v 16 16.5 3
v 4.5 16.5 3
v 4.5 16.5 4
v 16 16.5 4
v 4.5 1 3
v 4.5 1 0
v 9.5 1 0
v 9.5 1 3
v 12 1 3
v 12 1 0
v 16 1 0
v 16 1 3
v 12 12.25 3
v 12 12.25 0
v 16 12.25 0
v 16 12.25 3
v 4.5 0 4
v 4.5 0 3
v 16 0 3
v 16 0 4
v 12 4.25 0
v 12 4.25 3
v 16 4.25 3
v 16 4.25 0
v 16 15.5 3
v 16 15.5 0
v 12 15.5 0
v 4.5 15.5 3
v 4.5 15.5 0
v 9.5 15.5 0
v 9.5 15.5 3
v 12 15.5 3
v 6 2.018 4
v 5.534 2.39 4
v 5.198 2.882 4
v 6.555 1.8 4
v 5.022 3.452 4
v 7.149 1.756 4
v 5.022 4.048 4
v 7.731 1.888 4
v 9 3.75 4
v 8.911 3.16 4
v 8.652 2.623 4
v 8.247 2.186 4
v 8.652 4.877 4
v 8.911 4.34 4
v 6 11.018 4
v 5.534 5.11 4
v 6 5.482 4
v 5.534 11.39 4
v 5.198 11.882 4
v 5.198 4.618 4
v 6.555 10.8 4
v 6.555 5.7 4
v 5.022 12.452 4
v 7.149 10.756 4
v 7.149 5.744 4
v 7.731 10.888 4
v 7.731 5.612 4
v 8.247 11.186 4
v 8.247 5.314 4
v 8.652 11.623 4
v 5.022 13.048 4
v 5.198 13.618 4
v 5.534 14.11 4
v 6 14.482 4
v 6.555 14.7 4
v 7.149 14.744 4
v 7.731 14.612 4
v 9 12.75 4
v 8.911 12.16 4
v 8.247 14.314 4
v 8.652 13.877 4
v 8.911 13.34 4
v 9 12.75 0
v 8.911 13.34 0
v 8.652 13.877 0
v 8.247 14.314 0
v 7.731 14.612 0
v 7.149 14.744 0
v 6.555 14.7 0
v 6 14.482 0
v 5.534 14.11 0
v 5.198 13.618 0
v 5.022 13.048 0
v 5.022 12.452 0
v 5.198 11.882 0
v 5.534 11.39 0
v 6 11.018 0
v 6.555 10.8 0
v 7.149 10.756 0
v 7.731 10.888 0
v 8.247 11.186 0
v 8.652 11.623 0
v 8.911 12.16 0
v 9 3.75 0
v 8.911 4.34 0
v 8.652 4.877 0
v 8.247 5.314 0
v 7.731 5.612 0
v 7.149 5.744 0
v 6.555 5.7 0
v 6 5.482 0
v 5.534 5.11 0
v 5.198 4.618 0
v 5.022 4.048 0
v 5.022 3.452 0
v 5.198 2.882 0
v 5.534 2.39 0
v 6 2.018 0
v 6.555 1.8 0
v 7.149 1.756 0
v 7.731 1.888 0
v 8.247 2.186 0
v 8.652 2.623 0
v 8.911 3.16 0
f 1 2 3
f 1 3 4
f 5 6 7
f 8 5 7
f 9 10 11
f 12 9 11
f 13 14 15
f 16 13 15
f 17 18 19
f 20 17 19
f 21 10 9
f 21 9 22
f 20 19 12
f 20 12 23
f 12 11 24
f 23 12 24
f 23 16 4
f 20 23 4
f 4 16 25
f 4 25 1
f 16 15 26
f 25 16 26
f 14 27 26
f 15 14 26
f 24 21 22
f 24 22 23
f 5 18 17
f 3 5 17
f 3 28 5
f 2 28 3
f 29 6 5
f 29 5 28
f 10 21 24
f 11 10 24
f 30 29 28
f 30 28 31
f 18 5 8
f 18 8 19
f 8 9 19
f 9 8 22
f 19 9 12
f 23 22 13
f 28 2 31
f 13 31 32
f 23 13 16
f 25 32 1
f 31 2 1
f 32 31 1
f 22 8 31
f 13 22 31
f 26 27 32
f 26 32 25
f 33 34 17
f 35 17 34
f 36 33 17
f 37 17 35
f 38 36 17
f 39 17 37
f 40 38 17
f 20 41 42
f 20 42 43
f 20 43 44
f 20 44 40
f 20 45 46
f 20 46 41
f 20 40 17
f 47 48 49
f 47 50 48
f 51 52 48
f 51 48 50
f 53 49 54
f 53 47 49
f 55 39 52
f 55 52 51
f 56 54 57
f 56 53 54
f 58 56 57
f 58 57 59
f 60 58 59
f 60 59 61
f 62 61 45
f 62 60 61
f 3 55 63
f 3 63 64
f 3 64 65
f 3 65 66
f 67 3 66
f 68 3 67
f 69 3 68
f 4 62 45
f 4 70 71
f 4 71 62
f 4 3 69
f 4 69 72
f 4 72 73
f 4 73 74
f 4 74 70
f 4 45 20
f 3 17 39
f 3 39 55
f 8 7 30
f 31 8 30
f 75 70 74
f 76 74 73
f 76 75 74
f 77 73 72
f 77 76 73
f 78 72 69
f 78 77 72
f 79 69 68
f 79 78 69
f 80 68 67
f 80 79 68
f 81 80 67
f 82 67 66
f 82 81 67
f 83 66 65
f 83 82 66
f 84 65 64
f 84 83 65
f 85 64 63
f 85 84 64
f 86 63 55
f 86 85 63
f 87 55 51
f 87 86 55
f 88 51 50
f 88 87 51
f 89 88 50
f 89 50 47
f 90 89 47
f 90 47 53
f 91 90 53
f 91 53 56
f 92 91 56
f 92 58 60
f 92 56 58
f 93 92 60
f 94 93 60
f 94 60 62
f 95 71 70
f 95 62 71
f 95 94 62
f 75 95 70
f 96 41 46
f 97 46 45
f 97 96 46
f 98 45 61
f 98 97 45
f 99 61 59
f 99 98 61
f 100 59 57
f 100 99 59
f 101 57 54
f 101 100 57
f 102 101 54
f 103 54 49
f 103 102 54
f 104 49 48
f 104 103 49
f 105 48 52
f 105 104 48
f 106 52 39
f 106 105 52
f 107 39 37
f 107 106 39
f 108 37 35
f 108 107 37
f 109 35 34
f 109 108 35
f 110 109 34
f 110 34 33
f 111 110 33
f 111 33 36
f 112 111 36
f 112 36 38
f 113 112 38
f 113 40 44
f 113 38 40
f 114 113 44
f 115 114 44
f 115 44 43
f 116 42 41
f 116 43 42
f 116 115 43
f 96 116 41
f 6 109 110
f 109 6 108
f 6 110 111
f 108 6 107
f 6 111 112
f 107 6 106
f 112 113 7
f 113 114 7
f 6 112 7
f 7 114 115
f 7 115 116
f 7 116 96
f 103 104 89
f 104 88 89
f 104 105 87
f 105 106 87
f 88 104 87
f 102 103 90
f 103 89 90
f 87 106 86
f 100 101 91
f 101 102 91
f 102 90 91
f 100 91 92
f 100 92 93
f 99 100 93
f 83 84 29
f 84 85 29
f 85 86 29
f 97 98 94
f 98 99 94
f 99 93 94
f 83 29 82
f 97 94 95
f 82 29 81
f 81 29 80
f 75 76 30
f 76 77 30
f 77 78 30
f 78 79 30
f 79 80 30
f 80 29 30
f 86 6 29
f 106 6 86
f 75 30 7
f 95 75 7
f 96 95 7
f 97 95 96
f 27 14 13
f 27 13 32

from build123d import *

# Parameters (mm, degrees)
CYLINDER002_R     = 2
CYLINDER002_DEPTH = 20
ARRAY003_Y_COUNT  = 2
ARRAY003_Y_PITCH  = 9
BOX008_W          = 5
BOX008_H          = 8
BOX008_DEPTH      = 3
BOX006_W          = 5
BOX006_H          = 14.5
BOX006_DEPTH      = 3
BOX007_W          = 4
BOX007_H          = 14.5
BOX007_DEPTH      = 3
BOX005_W          = 11.5
BOX005_H          = 16.5
BOX005_DEPTH      = 1


with BuildPart() as hole_array_copy:
    # Cylinder002 → Cylinder002 (new body)
    with BuildSketch(Plane(origin=(7, 3.75, 0), x_dir=(1, 0, 0), z_dir=(0, 0, 1))):
        Circle(CYLINDER002_R)
    extrude(amount=CYLINDER002_DEPTH)

    # Array003 Y: hole array copy ×2


with BuildPart() as hole_array_copy_1:
    add(hole_array_copy.part)
    with Locations(*[(0, i * ARRAY003_Y_PITCH, 0) for i in range(1, ARRAY003_Y_COUNT)]):
        add(hole_array_copy.part)


with BuildPart() as protector_extraction_fusion:
    # Box008 → Box008 (new body)
    with BuildSketch(Plane(origin=(12, 4.25, 0), x_dir=(1, 0, 0), z_dir=(0, 0, 1))):
        with Locations((2.5, 4)):
            Rectangle(BOX008_W, BOX008_H)
    extrude(amount=BOX008_DEPTH)

    # Fusion002: union hole array copy
    add(hole_array_copy_1.part)


with BuildPart() as hole_stand_cube001:
    # Box006 → Box006 (new body)
    with BuildSketch(Plane(origin=(4.5, 1, 0), x_dir=(1, 0, 0), z_dir=(0, 0, 1))):
        with Locations((2.5, 7.25)):
            Rectangle(BOX006_W, BOX006_H)
    extrude(amount=BOX006_DEPTH)


with BuildPart() as usb_side_protection_cube:
    # Box007 → Box007 (new body)
    with BuildSketch(Plane(origin=(12, 1, 0), x_dir=(1, 0, 0), z_dir=(0, 0, 1))):
        with Locations((2, 7.25)):
            Rectangle(BOX007_W, BOX007_H)
    extrude(amount=BOX007_DEPTH)


with BuildPart() as protector_cut:
    # Box005 → Box005 (new body)
    with BuildSketch(Plane(origin=(4.5, 0, 3), x_dir=(1, 0, 0), z_dir=(0, 0, 1))):
        with Locations((5.75, 8.25)):
            Rectangle(BOX005_W, BOX005_H)
    extrude(amount=BOX005_DEPTH)

    # Fusion001: union hole stand cube001, usb side protection cube
    add(hole_stand_cube001.part)
    add(usb_side_protection_cube.part)

    # Cut003: cut protector extraction fusion
    add(protector_extraction_fusion.part, mode=Mode.SUBTRACT)


solid = protector_cut.part
